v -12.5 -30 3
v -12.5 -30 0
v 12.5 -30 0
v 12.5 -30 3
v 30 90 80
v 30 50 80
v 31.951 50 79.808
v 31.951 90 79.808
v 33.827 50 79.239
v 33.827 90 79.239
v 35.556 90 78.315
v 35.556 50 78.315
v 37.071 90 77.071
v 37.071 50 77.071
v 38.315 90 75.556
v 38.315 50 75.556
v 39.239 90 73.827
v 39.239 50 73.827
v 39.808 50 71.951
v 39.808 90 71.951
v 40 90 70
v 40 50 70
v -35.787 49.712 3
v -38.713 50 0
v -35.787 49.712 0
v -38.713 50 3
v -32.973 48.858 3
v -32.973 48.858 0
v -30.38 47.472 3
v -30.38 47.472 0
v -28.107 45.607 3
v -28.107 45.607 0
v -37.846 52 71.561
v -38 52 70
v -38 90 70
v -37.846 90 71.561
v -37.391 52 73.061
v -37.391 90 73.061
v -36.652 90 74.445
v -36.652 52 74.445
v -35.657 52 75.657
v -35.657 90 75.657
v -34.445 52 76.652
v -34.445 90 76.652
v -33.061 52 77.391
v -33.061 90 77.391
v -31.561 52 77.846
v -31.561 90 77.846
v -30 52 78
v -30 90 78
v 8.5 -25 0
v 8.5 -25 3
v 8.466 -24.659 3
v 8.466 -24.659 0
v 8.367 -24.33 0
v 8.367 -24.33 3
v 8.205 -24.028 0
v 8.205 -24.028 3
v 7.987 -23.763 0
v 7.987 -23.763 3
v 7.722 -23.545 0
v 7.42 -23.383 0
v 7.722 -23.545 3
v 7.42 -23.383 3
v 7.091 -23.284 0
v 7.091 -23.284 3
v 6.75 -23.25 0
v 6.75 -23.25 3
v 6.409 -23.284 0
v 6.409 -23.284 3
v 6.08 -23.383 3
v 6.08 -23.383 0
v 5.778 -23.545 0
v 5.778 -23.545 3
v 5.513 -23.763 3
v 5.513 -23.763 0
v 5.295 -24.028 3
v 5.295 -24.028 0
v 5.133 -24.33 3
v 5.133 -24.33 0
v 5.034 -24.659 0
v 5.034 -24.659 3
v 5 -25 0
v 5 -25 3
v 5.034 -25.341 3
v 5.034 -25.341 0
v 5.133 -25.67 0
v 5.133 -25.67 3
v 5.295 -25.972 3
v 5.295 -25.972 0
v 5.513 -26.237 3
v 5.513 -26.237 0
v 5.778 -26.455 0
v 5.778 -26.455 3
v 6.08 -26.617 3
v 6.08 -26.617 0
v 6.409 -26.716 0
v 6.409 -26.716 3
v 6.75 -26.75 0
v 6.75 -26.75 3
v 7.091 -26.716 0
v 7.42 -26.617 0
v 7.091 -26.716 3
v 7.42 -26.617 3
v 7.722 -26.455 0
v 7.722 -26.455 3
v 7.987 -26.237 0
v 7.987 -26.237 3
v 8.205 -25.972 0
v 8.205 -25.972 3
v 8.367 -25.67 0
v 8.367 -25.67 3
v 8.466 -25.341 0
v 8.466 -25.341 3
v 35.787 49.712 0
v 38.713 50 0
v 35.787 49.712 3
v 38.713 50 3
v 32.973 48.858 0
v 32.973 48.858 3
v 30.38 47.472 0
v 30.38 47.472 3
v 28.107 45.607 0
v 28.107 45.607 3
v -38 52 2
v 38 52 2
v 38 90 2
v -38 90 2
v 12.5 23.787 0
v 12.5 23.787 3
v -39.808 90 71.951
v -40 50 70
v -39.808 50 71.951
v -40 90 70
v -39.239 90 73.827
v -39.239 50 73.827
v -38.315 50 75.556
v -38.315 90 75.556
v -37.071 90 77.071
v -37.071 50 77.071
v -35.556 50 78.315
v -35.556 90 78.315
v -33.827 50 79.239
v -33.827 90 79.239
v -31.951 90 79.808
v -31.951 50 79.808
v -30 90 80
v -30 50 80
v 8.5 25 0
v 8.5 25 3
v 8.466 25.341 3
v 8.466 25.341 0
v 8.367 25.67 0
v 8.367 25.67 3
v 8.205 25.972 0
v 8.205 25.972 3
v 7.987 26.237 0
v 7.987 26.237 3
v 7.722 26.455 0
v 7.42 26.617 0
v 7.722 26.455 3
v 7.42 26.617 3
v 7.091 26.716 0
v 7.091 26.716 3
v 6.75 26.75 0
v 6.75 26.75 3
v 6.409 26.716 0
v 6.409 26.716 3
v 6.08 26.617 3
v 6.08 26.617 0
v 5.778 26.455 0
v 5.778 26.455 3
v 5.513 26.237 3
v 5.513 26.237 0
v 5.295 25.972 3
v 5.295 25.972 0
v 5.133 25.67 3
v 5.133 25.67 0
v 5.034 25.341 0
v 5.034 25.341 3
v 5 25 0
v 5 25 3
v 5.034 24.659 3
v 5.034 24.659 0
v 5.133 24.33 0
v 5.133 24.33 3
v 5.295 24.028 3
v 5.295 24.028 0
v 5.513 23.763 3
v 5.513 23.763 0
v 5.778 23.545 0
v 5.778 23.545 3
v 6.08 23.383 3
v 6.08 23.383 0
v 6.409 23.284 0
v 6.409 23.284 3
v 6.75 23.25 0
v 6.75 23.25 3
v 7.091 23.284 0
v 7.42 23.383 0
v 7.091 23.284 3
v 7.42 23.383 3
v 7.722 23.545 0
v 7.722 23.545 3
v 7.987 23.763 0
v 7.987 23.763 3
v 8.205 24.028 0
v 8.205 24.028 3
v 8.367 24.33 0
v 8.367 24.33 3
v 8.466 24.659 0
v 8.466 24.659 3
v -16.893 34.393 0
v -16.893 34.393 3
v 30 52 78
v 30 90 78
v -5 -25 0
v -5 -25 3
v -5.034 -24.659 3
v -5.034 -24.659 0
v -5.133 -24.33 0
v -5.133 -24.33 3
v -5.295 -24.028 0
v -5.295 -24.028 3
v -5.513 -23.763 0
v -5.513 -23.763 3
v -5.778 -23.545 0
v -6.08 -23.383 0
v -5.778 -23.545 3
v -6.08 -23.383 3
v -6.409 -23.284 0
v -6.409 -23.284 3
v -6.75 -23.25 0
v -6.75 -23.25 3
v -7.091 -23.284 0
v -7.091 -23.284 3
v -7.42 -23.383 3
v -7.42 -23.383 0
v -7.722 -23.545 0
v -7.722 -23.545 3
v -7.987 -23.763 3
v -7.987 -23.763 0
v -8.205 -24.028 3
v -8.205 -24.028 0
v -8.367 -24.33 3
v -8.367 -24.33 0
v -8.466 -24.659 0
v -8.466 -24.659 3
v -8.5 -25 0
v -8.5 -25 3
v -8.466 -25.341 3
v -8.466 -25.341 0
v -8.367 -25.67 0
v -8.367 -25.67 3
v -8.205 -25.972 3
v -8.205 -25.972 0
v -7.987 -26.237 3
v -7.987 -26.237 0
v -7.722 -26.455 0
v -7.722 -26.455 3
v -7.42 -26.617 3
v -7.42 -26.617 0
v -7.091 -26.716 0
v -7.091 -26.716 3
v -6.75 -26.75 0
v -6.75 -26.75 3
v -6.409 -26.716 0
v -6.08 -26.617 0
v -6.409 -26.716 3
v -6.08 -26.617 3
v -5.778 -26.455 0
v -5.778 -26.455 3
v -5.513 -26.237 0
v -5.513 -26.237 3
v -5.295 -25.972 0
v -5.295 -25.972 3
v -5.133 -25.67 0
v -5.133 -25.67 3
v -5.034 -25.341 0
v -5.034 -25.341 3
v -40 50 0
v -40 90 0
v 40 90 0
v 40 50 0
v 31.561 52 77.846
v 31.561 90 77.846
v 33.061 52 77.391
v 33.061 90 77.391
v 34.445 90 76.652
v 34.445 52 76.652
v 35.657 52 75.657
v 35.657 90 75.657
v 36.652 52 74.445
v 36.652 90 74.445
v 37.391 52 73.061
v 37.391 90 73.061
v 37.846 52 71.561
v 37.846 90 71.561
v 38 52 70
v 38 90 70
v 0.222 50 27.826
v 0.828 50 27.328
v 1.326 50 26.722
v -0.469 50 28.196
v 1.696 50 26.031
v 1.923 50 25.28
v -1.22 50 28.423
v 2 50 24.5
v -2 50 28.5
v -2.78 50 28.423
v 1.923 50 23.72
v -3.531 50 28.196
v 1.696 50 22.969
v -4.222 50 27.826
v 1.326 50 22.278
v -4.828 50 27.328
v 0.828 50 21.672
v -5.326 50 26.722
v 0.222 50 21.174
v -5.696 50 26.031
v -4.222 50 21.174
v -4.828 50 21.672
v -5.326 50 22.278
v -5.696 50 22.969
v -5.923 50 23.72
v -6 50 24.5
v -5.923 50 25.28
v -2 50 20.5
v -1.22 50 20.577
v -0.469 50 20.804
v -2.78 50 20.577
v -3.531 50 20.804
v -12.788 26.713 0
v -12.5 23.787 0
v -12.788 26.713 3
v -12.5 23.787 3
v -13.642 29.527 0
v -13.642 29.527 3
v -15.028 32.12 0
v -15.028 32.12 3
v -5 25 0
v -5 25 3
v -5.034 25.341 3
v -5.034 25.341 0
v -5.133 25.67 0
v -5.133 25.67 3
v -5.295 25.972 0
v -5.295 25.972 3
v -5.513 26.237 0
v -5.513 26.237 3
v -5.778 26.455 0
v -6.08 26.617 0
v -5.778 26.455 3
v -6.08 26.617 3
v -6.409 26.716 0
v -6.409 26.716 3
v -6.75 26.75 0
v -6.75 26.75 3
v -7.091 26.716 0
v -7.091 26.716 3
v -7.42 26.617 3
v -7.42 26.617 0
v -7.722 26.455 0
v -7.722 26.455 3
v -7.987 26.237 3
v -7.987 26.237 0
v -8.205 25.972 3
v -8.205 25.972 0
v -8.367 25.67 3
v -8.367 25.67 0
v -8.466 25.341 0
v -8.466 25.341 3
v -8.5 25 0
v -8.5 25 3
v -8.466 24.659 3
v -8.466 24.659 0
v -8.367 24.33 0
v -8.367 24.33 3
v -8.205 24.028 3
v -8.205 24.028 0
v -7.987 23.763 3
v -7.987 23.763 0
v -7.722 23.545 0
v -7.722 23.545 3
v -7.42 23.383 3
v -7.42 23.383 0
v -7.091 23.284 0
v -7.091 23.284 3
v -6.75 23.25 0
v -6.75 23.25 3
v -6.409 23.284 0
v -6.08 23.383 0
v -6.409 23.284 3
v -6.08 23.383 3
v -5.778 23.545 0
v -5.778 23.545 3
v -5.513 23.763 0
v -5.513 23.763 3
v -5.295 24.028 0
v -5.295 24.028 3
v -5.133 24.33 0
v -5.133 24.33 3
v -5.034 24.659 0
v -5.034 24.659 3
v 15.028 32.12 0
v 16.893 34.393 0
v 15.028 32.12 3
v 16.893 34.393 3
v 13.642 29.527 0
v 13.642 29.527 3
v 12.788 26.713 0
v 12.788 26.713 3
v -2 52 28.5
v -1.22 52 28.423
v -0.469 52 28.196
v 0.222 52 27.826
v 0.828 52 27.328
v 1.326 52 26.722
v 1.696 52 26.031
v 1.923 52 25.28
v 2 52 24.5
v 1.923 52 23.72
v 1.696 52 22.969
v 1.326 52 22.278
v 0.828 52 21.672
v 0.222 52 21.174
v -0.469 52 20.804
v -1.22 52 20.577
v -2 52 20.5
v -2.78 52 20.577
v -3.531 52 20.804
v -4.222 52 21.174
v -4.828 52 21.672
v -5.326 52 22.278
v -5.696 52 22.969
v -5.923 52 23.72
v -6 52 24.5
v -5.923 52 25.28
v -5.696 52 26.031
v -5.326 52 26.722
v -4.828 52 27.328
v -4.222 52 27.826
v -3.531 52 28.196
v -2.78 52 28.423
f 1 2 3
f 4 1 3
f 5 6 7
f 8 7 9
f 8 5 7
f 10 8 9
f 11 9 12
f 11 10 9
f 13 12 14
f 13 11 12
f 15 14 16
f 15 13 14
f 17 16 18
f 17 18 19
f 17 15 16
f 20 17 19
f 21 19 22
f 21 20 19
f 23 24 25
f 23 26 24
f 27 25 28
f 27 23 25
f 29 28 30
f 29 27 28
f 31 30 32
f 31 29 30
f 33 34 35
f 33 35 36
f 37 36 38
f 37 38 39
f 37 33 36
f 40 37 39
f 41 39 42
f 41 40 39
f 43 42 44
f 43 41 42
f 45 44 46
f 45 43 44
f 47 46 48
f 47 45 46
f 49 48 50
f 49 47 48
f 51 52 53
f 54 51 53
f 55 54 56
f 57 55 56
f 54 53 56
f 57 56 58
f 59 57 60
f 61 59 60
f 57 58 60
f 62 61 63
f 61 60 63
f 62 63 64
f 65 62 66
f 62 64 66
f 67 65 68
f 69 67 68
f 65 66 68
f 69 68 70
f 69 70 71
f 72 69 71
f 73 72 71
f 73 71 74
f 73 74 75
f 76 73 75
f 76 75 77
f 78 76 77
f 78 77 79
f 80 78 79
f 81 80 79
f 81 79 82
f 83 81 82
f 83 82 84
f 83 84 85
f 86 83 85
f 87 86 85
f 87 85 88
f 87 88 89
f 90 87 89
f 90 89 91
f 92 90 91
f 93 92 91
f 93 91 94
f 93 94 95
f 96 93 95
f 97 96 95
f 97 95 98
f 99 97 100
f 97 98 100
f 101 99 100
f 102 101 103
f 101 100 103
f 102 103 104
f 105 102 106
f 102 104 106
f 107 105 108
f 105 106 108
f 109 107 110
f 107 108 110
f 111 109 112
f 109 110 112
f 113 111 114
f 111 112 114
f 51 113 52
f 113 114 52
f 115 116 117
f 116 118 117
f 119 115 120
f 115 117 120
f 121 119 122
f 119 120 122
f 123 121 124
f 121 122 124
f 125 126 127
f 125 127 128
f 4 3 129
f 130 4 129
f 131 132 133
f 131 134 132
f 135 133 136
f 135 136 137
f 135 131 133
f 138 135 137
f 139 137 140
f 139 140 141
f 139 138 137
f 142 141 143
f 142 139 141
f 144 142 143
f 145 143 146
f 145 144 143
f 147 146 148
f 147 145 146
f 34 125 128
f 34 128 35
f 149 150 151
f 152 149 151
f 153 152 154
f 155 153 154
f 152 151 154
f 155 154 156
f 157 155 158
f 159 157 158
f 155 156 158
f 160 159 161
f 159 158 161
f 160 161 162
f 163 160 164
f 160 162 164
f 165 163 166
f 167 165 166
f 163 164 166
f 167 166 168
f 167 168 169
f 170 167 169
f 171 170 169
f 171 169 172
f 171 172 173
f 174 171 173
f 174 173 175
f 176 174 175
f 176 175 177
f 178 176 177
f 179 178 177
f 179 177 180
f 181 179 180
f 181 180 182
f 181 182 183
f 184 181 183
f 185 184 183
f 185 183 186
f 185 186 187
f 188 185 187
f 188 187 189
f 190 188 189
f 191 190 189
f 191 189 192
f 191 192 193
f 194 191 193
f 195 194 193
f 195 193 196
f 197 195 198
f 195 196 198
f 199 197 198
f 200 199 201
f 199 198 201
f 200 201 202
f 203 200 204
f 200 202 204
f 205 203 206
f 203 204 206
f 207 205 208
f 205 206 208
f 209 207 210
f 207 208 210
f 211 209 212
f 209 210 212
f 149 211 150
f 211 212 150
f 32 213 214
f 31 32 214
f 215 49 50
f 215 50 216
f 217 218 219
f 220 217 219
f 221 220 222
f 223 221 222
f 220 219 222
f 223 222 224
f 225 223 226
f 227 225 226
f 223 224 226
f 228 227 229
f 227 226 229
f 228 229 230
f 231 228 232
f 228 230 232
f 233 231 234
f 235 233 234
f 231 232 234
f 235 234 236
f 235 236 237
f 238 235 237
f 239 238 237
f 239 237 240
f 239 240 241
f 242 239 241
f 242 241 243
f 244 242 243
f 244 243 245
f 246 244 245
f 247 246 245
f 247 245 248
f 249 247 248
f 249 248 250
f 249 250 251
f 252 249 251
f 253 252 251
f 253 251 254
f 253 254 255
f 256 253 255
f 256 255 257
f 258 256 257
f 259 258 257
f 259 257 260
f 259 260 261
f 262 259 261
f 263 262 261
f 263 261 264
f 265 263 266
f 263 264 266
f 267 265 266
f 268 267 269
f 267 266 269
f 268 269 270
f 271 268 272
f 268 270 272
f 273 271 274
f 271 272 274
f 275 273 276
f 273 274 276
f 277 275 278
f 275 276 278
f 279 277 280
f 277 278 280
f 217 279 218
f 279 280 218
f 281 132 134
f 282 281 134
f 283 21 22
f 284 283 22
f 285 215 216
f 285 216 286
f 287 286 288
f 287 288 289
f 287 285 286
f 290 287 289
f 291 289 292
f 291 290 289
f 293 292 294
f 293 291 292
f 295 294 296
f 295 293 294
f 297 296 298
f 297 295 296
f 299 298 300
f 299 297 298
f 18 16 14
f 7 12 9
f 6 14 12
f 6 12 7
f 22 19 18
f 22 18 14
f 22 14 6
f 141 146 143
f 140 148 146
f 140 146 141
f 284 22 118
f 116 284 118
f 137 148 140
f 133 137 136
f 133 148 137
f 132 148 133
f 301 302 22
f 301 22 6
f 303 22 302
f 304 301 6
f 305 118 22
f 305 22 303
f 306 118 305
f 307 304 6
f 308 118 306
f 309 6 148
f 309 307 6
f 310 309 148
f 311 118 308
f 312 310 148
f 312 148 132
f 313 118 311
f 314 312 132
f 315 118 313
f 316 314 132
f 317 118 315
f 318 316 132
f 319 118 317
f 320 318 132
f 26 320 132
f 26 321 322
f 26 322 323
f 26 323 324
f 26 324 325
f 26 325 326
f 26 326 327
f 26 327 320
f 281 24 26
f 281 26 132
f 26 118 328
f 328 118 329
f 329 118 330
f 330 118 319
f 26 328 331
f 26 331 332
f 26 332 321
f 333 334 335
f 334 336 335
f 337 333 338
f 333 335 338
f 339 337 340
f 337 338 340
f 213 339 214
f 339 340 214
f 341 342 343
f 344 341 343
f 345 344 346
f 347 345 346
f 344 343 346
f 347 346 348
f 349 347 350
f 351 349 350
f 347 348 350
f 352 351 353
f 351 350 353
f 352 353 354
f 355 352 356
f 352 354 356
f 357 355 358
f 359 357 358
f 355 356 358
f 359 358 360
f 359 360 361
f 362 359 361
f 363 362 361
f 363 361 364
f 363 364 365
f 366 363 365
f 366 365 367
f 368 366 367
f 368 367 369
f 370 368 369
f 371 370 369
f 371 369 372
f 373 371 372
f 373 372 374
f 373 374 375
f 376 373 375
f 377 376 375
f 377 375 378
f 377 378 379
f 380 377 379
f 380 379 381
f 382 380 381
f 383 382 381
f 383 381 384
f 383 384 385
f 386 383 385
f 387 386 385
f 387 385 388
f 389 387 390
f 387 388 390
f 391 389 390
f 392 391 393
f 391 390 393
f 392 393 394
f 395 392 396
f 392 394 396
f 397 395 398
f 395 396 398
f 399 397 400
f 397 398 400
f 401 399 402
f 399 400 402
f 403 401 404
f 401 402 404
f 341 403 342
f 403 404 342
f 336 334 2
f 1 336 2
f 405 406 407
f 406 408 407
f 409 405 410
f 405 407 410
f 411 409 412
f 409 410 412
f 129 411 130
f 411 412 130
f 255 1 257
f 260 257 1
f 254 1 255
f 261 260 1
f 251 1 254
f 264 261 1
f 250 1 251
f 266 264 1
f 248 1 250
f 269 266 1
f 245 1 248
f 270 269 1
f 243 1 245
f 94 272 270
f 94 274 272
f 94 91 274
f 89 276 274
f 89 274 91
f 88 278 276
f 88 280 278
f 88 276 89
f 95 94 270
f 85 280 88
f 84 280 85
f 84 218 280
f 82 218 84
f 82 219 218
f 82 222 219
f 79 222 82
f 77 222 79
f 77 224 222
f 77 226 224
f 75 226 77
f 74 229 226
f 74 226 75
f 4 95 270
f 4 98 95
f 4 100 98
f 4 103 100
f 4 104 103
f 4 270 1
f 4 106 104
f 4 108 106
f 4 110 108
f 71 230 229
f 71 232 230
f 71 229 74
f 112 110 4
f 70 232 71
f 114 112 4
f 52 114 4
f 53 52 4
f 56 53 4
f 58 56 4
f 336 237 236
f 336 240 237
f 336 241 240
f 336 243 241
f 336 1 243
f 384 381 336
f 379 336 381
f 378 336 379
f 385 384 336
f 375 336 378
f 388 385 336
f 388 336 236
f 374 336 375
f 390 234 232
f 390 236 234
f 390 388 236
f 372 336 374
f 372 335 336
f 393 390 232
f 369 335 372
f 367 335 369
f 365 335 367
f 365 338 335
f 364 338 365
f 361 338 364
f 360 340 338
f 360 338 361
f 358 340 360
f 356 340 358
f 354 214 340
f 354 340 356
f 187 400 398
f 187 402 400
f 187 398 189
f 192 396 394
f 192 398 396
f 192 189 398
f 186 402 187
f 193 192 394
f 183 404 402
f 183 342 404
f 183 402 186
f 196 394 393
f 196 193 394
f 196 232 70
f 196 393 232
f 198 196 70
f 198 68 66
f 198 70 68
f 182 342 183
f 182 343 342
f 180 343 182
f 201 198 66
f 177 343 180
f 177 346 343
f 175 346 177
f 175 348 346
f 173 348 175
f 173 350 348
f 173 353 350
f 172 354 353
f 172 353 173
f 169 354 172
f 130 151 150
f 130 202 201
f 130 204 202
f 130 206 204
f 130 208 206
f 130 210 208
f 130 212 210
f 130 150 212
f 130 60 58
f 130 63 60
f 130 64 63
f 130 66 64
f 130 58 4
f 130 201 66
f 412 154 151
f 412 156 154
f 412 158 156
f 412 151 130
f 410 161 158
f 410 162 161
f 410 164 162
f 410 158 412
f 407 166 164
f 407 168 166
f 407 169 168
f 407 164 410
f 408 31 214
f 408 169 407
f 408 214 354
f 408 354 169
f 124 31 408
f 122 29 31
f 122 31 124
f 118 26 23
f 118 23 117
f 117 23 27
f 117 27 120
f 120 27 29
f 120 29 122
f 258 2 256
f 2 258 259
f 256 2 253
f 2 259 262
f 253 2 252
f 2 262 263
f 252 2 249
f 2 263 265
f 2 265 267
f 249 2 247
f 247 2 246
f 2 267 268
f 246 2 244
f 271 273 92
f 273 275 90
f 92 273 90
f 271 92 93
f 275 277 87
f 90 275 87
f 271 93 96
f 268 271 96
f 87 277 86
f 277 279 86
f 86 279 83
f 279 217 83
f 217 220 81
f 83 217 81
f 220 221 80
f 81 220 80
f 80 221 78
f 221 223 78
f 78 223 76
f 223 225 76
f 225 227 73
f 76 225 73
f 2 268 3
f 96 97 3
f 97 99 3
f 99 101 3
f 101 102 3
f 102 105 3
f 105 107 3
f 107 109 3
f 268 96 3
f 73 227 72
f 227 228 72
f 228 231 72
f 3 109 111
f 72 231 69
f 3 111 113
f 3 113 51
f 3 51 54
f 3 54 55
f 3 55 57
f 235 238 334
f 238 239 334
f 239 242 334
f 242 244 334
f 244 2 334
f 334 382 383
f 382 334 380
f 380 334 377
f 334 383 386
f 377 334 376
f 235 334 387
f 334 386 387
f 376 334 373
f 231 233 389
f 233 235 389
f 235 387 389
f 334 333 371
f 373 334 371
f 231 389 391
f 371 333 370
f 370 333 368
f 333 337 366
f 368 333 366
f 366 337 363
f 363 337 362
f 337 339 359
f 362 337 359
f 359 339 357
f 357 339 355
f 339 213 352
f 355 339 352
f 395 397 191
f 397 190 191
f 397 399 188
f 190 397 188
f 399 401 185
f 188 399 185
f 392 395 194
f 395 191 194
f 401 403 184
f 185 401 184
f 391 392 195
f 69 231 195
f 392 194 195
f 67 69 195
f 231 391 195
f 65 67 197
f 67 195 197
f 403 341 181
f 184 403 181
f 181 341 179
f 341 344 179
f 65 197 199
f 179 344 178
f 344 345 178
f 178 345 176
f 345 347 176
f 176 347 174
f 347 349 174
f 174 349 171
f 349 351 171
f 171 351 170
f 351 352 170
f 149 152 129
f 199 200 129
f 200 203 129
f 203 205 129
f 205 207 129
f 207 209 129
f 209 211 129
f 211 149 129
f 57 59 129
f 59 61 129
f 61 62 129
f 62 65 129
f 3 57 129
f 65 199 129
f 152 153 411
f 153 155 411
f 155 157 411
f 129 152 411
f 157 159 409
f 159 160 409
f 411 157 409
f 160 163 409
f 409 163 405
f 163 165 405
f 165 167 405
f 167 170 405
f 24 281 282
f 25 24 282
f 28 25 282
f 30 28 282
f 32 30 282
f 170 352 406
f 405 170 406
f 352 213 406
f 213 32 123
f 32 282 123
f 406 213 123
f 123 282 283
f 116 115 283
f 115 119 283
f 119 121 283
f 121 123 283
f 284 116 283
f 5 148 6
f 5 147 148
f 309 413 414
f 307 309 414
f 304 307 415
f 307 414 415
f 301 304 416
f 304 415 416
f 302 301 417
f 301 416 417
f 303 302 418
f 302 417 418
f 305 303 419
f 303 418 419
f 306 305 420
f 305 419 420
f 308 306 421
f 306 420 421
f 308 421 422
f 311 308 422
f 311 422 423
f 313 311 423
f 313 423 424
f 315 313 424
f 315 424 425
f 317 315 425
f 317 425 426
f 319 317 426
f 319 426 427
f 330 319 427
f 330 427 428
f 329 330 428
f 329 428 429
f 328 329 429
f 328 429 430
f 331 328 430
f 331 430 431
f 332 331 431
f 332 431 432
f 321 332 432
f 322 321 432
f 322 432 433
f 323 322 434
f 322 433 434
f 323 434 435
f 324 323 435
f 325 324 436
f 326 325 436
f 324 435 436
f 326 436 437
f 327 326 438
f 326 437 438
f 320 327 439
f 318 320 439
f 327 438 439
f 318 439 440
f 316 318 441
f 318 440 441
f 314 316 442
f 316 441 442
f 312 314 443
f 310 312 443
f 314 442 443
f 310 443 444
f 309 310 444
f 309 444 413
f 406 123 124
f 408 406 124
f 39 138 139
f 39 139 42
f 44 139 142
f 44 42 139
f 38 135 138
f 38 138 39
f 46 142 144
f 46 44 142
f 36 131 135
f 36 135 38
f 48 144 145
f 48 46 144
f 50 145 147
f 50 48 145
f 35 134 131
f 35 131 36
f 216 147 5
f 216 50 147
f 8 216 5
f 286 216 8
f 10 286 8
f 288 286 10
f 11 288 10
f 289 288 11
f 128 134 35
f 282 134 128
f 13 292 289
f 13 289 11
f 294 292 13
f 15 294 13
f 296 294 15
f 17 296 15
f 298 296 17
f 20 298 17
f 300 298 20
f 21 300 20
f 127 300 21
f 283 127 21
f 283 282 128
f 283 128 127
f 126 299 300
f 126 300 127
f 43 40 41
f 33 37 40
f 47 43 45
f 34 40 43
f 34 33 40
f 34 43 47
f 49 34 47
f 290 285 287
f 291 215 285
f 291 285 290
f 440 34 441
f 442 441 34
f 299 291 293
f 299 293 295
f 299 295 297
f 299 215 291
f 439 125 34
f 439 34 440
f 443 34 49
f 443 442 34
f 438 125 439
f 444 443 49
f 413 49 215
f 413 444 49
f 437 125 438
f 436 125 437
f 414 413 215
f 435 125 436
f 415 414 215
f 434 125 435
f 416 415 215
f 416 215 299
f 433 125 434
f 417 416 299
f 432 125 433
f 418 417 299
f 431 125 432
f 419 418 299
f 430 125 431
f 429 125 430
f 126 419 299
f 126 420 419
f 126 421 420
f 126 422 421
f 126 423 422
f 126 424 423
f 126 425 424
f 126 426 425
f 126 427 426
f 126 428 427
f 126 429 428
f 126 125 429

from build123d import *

# Parameters (mm, degrees)
SKETCH1_W           = 25
SKETCH1_H           = 60
BOSS_EXTRUDE1_DEPTH = 3
BOSS_EXTRUDE3_START = -3
SKETCH2_W           = 80
SKETCH2_H           = 40
BOSS_EXTRUDE3_DEPTH = 80
FILLET1_R           = 10
SHELL1_START        = 52
SHELL1_DEPTH        = 38
SKETCH3_R           = 4
CUT_EXTRUDE1_DEPTH  = 100
SKETCH4_R           = 1.75
CUT_EXTRUDE2_DEPTH  = 100
CHAMFER1_SIZE       = 20
FILLET2_R           = 15


with BuildPart() as part:
    # Sketch1 → Boss-Extrude1 (new body)
    with BuildSketch(Plane.XY):
        Rectangle(SKETCH1_W, SKETCH1_H)
        Polygon((12.5, 50), (12.5, 30), (-12.5, 30), (-12.5, 50), (-40, 50), (-40, 90), (40, 90), (40, 50), align=None)
    extrude(amount=BOSS_EXTRUDE1_DEPTH)

    # Sketch2 → Boss-Extrude3 (add)
    with BuildSketch(Plane.XY.offset(3).offset(BOSS_EXTRUDE3_START)):
        with Locations((0, 70)):
            Rectangle(SKETCH2_W, SKETCH2_H)
    extrude(amount=BOSS_EXTRUDE3_DEPTH)

    # Fillet1
    fillet1_edges = [part.edges().sort_by_distance(p)[0] for p in [
        (-40, 70, 80),
        (40, 70, 80),
    ]]
    fillet(fillet1_edges, radius=FILLET1_R)

    # Shell1: read off the stored shape, not the designer's step
    # Shell1 outline → Shell1 (cut)
    with BuildSketch(Plane(origin=(0, 0, 0), x_dir=(1, 0, 0), z_dir=(0, 1, 0)).offset(SHELL1_START)):
        with BuildLine():
            ThreePointArc((30, -78), (35.656854249, -75.656854249), (38, -70))
            Line((38, -70), (38, -2))
            Line((38, -2), (-38, -2))
            Line((-38, -2), (-38, -70))
            ThreePointArc((-38, -70), (-35.656854249, -75.656854249), (-30, -78))
            Line((-30, -78), (30, -78))
        make_face()
    extrude(amount=SHELL1_DEPTH, mode=Mode.SUBTRACT)

    # Sketch3 → Cut-Extrude1 (cut)
    with BuildSketch(Plane(origin=(0, 52, 0), x_dir=(1, 0, 0), z_dir=(0, 1, 0))):
        with Locations(Location((-2, -24.5, 0), (0, 0, 270))):
            Circle(SKETCH3_R)
    extrude(amount=-CUT_EXTRUDE1_DEPTH, mode=Mode.SUBTRACT)

    # Sketch4 → Cut-Extrude2 (cut)
    with BuildSketch(Plane.XY.offset(3)):
        with Locations((-6.75, 25)):
            Circle(SKETCH4_R)
        with Locations((6.75, 25)):
            Circle(SKETCH4_R)
        with Locations((6.75, -25)):
            Circle(SKETCH4_R)
        with Locations((-6.75, -25)):
            Circle(SKETCH4_R)
    extrude(amount=-CUT_EXTRUDE2_DEPTH, mode=Mode.SUBTRACT)

    # Chamfer1
    chamfer1_edges = [part.edges().sort_by_distance(p)[0] for p in [
        (-12.5, 50, 1.5),
        (12.5, 50, 1.5),
    ]]
    chamfer(chamfer1_edges, length=CHAMFER1_SIZE)

    # Fillet2
    fillet2_edges = [part.edges().sort_by_distance(p)[0] for p in [
        (-32.5, 50, 1.5),
        (32.5, 50, 1.5),
        (12.5, 30, 1.5),
        (-12.5, 30, 1.5),
    ]]
    fillet(fillet2_edges, radius=FILLET2_R)


solid = part.part
